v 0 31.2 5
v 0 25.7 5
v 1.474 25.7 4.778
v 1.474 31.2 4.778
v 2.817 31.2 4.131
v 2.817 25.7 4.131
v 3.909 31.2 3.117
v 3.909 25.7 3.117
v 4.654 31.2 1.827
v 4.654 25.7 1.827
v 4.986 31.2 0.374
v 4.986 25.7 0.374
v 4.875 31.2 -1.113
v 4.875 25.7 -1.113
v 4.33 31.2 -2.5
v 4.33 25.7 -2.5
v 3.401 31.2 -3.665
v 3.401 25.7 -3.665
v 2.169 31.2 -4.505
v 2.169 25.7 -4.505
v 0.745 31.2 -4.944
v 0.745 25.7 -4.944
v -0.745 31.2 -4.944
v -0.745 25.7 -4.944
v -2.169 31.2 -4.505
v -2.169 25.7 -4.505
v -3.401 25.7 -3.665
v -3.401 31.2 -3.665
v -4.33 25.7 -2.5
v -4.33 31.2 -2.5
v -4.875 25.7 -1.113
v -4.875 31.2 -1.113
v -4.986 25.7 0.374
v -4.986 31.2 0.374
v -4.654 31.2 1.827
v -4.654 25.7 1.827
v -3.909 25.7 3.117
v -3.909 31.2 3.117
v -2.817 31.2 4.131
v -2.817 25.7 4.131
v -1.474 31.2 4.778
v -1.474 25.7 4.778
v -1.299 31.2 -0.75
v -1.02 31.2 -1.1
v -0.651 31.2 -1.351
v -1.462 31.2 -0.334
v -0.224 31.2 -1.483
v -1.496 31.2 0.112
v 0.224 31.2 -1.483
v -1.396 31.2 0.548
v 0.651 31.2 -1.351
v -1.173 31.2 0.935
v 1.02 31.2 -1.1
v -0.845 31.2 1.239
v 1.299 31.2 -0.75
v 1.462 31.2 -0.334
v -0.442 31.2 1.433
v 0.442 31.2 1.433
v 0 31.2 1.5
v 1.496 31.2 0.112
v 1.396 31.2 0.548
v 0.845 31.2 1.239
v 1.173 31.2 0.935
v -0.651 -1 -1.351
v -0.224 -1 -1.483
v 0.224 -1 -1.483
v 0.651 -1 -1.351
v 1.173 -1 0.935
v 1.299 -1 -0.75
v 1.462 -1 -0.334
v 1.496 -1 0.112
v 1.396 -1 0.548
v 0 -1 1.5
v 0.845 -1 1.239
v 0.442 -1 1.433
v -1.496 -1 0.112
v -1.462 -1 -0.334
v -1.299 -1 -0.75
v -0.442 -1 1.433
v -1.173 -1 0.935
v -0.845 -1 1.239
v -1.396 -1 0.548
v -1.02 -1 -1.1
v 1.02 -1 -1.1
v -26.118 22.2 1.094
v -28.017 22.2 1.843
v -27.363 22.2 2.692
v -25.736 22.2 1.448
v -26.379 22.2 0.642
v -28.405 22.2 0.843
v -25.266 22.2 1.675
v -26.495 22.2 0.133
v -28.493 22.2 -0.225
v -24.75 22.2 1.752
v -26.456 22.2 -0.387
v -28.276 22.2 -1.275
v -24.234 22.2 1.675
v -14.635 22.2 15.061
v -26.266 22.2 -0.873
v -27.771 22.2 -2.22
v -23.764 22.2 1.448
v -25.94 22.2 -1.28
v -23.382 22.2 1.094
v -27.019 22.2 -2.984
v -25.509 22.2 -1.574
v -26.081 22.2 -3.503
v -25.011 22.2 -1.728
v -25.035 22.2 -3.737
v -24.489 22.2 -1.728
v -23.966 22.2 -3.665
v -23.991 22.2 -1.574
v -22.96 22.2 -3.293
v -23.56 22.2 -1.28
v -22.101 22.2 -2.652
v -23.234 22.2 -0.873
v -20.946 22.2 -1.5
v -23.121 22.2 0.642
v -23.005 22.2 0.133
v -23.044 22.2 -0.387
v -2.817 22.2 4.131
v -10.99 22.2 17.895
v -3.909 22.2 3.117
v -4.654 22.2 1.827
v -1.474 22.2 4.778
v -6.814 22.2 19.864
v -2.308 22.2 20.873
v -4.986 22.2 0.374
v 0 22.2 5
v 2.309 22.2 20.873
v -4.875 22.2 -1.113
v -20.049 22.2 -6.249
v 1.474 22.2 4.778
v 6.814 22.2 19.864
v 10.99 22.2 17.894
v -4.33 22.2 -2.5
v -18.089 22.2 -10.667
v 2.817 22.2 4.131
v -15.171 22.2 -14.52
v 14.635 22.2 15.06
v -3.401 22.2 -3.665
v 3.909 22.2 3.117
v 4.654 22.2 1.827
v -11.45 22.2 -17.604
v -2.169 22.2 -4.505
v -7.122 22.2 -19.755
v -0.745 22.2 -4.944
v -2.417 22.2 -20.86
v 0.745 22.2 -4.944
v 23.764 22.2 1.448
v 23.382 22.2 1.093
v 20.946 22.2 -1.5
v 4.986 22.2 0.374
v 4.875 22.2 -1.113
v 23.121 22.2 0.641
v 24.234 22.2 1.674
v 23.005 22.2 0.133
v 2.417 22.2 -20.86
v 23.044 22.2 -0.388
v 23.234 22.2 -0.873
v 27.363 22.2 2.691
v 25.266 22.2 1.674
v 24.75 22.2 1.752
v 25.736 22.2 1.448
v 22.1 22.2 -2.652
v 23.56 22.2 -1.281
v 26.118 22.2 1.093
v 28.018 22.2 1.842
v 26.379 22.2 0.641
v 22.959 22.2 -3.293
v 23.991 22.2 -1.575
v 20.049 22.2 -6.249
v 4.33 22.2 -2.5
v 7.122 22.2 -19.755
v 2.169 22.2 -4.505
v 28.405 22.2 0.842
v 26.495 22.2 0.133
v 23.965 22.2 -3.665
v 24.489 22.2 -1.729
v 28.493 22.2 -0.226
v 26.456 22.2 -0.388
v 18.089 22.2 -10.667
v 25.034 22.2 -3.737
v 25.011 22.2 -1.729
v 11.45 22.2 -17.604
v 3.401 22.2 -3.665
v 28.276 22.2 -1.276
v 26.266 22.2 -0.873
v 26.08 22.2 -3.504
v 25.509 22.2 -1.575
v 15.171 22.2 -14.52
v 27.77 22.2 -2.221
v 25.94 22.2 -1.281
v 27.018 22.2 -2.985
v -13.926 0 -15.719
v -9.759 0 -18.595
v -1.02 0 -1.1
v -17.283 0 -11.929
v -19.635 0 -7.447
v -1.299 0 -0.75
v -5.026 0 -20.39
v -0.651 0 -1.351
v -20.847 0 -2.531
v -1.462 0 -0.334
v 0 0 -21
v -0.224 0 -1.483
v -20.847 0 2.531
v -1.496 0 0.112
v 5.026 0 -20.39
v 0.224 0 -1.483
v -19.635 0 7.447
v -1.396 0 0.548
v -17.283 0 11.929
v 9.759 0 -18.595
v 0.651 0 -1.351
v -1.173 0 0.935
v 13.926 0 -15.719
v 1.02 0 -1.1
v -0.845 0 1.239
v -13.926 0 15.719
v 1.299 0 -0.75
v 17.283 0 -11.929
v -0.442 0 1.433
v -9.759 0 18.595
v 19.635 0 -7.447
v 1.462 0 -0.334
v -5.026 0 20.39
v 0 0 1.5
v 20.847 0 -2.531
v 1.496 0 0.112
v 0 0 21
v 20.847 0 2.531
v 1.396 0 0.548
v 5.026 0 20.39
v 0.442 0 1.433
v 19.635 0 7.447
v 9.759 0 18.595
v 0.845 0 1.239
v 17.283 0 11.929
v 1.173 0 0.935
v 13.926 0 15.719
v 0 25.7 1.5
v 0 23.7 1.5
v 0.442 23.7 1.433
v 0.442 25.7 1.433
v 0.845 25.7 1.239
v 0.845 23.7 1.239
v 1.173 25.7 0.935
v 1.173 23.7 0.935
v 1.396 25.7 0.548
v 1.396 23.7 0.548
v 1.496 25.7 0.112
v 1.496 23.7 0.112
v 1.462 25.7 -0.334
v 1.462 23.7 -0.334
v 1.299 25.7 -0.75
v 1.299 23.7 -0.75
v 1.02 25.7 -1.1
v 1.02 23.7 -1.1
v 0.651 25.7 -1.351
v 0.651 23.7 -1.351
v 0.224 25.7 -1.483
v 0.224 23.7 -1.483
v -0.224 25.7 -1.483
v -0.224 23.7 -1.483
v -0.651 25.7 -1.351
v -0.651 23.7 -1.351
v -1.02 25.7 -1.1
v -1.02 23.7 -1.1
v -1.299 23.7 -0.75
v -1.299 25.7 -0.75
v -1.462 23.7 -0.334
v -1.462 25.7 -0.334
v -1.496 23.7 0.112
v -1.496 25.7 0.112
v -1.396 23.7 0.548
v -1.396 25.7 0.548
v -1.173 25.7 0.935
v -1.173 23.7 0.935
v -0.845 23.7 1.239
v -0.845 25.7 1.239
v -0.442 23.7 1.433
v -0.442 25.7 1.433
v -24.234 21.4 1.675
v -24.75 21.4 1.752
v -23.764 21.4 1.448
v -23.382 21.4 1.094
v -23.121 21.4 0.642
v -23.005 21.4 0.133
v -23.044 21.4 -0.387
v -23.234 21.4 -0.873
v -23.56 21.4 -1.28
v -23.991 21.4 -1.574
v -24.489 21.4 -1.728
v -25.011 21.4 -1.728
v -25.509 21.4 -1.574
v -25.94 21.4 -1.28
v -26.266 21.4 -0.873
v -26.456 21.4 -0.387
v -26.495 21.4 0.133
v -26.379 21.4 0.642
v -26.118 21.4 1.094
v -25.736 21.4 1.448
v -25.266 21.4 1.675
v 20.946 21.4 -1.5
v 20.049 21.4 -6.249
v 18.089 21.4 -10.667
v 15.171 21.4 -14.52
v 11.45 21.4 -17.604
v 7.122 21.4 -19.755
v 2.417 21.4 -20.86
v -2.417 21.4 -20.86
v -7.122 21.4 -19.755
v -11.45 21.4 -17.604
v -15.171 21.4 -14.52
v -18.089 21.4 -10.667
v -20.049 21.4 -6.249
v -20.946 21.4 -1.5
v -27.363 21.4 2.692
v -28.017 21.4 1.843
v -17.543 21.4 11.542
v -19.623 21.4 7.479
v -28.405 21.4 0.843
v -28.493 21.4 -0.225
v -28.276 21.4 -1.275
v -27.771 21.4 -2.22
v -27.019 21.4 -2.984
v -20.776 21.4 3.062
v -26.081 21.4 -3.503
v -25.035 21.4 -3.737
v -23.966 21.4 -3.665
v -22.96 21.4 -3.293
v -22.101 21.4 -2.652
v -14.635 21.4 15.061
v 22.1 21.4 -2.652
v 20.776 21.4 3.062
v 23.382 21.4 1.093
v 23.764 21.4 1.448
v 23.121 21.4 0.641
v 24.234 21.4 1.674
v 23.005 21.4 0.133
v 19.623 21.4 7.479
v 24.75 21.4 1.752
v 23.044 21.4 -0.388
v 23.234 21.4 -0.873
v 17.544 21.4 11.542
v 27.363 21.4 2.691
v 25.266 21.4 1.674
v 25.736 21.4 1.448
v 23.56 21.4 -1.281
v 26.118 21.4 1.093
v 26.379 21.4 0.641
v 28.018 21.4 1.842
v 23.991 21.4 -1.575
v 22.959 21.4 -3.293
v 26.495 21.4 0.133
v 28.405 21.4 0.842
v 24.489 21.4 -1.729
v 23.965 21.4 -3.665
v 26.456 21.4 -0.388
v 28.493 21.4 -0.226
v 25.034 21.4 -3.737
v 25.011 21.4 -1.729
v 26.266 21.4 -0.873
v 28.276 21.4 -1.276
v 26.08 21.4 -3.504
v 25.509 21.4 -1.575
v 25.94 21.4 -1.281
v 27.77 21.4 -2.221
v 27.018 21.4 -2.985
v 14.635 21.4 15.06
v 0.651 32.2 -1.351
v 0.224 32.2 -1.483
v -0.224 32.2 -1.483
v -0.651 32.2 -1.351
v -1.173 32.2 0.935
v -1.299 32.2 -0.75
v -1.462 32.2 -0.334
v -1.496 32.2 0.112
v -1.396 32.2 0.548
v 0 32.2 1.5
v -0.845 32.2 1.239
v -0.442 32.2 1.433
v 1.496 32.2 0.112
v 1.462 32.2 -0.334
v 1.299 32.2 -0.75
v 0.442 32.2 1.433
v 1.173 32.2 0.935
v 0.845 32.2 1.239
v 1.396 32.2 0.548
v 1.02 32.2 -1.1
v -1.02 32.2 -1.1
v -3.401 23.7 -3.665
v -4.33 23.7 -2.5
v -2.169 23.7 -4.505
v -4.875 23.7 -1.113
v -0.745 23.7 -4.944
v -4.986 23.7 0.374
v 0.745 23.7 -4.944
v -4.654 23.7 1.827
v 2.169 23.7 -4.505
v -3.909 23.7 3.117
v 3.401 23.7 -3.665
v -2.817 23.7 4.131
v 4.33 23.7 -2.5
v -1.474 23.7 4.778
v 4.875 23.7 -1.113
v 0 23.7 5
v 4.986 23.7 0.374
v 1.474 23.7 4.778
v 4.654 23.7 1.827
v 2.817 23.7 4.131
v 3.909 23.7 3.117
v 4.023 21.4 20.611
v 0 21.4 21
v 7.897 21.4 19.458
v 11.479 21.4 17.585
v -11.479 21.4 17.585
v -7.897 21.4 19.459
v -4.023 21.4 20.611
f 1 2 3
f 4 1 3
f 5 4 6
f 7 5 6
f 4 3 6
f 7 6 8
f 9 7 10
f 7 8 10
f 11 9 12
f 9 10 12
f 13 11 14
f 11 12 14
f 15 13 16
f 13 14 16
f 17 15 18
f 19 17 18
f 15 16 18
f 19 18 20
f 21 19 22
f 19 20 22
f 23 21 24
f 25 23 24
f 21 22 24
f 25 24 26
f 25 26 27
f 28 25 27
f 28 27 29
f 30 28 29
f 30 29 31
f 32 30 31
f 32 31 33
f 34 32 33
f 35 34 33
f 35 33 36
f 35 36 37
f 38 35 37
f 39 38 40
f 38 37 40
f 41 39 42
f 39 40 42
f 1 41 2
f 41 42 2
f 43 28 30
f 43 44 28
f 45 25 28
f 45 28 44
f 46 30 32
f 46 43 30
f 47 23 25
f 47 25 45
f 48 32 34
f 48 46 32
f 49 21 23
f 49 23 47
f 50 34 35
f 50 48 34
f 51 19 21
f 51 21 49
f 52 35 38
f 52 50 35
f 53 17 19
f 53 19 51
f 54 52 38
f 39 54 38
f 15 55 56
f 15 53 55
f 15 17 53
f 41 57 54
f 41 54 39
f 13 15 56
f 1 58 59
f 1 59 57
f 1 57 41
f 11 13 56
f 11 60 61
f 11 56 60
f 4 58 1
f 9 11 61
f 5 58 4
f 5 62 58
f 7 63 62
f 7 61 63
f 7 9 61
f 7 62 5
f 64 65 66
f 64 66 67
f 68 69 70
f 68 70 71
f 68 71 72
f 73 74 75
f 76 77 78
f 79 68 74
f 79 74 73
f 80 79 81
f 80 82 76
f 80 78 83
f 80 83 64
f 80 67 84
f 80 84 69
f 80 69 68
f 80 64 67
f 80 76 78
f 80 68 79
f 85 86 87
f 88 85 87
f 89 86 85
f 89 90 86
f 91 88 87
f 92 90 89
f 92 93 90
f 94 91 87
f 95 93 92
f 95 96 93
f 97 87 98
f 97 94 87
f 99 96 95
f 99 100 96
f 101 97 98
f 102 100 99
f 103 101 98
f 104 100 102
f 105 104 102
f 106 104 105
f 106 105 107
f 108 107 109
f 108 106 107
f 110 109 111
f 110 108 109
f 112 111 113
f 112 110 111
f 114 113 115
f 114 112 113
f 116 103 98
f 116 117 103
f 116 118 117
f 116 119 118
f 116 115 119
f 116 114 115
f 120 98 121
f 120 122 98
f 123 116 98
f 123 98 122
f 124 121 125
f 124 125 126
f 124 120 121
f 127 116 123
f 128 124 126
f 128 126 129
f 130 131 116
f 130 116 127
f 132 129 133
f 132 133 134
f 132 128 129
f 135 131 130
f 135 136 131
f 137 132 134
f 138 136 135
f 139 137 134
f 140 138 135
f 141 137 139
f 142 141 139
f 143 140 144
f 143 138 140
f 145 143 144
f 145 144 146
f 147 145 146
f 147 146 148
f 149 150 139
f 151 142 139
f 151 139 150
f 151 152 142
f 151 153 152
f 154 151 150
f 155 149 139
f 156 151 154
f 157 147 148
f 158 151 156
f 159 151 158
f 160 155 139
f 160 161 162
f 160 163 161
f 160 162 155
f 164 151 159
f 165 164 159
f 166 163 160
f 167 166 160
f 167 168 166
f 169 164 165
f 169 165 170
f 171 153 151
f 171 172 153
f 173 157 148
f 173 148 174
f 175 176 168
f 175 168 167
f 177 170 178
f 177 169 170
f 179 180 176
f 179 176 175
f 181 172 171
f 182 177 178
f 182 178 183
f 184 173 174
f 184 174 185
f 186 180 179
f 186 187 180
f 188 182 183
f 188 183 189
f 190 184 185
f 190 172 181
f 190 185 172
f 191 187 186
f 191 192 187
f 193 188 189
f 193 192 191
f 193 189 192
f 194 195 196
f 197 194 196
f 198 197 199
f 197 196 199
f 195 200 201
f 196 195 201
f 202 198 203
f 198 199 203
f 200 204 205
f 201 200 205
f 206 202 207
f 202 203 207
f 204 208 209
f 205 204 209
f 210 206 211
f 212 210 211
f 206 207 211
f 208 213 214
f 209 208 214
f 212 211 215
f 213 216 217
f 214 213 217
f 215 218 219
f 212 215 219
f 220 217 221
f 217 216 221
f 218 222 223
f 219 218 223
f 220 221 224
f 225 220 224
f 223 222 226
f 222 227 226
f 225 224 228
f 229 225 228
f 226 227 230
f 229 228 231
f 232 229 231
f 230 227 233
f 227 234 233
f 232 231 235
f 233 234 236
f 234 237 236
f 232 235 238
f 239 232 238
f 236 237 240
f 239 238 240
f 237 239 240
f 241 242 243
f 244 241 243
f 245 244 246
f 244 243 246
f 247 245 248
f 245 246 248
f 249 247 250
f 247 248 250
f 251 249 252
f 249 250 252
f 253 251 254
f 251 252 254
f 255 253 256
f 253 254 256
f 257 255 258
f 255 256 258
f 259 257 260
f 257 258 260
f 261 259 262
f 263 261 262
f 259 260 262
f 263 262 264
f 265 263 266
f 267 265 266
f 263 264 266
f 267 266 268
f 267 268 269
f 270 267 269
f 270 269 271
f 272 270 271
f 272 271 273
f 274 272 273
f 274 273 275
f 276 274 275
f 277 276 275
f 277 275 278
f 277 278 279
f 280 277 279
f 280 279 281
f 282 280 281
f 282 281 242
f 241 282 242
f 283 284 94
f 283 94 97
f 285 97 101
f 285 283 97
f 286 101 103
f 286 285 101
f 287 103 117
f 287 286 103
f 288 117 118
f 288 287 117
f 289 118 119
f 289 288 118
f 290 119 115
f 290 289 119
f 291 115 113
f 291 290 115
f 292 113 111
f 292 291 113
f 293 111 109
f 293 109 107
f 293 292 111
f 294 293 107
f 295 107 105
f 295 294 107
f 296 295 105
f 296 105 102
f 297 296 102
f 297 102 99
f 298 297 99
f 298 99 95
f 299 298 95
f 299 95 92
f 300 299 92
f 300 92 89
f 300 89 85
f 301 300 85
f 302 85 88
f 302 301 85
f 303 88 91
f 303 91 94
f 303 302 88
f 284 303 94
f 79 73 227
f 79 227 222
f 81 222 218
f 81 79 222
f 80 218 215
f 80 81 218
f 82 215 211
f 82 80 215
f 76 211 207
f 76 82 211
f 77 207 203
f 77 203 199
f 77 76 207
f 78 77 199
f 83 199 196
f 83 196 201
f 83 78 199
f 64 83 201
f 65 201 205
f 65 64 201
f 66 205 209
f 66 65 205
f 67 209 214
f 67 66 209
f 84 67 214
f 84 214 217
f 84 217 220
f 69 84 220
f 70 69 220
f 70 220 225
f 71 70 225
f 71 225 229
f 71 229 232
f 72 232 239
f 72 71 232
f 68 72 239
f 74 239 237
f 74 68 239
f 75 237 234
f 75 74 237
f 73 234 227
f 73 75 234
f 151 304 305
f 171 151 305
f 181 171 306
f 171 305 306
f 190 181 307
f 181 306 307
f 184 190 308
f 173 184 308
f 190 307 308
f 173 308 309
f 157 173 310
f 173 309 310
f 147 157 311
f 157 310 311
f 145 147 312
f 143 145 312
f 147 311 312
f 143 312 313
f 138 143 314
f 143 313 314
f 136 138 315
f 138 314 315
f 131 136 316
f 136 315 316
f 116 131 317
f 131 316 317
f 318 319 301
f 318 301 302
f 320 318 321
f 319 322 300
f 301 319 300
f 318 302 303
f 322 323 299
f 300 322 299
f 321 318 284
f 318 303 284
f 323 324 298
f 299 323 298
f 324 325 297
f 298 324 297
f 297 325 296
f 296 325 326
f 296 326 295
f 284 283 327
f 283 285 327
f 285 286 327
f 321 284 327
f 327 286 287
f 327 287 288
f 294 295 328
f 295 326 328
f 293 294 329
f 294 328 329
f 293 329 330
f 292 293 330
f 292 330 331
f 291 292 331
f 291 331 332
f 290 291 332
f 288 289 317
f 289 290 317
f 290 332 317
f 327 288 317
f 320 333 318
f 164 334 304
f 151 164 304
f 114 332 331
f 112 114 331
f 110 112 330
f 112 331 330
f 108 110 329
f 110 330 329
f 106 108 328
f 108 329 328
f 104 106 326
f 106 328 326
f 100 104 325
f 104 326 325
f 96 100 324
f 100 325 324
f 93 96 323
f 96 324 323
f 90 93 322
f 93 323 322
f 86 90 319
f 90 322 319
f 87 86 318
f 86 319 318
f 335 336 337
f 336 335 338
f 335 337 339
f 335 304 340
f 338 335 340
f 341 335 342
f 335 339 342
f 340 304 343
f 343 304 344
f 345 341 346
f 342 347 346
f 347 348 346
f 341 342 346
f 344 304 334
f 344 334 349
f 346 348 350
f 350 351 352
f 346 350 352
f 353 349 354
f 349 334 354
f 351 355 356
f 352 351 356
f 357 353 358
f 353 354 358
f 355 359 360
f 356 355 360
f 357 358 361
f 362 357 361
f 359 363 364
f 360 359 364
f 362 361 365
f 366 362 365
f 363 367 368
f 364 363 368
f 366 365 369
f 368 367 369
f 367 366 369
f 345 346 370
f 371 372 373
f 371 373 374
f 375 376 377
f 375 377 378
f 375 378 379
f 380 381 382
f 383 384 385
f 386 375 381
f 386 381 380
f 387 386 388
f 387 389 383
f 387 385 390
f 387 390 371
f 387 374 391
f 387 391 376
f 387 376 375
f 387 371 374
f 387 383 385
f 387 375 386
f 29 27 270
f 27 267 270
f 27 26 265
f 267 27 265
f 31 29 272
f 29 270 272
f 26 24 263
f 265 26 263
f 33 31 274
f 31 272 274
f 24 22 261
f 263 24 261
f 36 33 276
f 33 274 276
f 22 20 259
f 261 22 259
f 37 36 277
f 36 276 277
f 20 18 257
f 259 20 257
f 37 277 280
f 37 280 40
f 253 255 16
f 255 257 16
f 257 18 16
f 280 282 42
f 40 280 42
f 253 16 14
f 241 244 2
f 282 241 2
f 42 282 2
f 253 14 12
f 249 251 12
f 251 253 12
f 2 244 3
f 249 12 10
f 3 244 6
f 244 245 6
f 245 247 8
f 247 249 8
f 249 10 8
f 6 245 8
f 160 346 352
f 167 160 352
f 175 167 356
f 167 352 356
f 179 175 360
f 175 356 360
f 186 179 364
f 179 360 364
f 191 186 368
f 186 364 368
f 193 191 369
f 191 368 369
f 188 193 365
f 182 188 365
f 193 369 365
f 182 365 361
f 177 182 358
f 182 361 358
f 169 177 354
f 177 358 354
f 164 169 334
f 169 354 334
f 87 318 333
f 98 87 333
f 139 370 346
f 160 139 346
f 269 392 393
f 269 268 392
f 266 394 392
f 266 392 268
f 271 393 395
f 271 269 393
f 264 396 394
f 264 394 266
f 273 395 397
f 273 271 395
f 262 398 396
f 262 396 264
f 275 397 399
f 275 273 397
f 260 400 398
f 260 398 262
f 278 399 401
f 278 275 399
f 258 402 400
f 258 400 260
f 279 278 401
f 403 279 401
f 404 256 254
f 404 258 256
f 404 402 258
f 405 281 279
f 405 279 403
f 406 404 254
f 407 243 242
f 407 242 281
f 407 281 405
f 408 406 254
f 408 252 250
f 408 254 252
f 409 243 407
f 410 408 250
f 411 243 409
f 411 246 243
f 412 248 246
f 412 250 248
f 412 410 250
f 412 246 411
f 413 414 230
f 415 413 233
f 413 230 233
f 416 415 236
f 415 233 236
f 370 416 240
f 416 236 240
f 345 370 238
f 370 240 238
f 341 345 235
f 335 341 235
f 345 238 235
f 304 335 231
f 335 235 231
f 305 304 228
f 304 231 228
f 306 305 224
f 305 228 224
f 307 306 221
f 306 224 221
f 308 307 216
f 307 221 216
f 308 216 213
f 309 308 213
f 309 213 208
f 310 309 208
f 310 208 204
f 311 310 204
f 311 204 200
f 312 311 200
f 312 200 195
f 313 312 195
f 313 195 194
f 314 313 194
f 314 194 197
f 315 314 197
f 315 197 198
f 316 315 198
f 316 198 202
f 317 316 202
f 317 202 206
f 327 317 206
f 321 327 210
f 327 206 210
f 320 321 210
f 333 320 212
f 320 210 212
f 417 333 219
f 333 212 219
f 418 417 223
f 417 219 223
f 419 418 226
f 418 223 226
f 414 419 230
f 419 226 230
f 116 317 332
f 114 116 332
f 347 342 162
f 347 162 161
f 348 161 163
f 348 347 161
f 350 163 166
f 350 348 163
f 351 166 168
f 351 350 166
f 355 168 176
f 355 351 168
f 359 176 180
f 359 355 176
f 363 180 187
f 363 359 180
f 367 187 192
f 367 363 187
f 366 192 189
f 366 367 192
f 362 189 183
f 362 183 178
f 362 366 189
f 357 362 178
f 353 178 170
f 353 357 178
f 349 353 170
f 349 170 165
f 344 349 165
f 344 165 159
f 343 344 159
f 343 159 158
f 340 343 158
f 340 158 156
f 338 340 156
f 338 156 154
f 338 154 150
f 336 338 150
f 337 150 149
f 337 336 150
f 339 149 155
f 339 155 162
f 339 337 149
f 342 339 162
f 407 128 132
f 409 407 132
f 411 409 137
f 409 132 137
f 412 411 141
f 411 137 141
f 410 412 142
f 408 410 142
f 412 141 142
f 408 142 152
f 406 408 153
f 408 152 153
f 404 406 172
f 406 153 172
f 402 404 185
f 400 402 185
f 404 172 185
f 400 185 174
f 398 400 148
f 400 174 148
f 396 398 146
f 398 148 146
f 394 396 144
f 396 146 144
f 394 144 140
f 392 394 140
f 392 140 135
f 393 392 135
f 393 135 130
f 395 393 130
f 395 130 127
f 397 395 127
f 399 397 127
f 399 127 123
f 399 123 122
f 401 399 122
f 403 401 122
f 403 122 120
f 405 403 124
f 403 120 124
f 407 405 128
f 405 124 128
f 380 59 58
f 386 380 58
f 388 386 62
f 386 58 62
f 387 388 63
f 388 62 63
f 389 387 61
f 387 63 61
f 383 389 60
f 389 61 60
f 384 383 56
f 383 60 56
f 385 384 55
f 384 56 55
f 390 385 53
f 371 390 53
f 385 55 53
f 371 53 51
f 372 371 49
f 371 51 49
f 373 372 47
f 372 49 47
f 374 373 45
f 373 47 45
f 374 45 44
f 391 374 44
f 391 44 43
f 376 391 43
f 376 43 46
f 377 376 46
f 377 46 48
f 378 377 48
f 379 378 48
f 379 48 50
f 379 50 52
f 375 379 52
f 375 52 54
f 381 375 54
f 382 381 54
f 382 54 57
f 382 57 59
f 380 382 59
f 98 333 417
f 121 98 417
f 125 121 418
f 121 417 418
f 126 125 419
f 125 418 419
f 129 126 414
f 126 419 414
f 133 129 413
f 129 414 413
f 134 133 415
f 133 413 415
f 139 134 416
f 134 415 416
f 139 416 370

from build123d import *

# Parameters (mm, degrees)
CROQUIS1_R              = 21
SALIENTE_EXTRUIR1_DEPTH = 21.4
CROQUIS2_R              = 1.750000001
CROQUIS2_R_2            = 1.75
SALIENTE_EXTRUIR2_DEPTH = 0.8
CROQUIS3_R              = 5
SALIENTE_EXTRUIR3_DEPTH = 1.5
CROQUIS4_R              = 1.5
SALIENTE_EXTRUIR4_DEPTH = 8.5
CROQUIS5_R              = 5
CROQUIS5_R_2            = 1.5
SALIENTE_EXTRUIR5_DEPTH = 5.5
SALIENTE_EXTRUIR6_START = 1
CROQUIS6_R              = 1.5
SALIENTE_EXTRUIR6_DEPTH = 1


with BuildPart() as part:
    # Croquis1 → Saliente-Extruir1 (new body)
    with BuildSketch(Plane(origin=(0, 0, 0), x_dir=(1, 0, 0), z_dir=(0, 1, 0))):
        with Locations(Location((0, 0, 0), (0, 0, 270))):
            Circle(CROQUIS1_R)
    extrude(amount=SALIENTE_EXTRUIR1_DEPTH)

    # Croquis2 → Saliente-Extruir2 (add)
    with BuildSketch(Plane(origin=(0, 21.4, 0), x_dir=(1, 0, 0), z_dir=(0, 1, 0))):
        with BuildLine():
            Line((-27.36337, -2.691836219), (-14.634872681, -15.060561132))
            ThreePointArc((-14.634872681, -15.060561132), (0.00030013, -20.999999998), (14.635303163, -15.060142806))
            Line((14.635303163, -15.060142806), (27.363446993, -2.691054009))
            ThreePointArc((27.363446993, -2.691054009), (27.421544543, 2.629863133), (22.100355918, 2.651912466))
            Line((22.100355918, 2.651912466), (20.946382723, 1.499683579))
            ThreePointArc((20.946382723, 1.499683579), (1e-09, 21), (-20.946382722, 1.499683581))
            Line((-20.946382722, 1.499683581), (-22.101170465, 2.652018145))
            ThreePointArc((-22.101170465, 2.652018145), (-27.421985882, 2.628707389), (-27.36337, -2.691836219))
        make_face()
        with Locations(Location((24.75, -0.001742794, 0), (0, 0, 270))):
            Circle(CROQUIS2_R, mode=Mode.SUBTRACT)
        with Locations(Location((-24.749999879, -0.002450302, 0), (0, 0, 270))):
            Circle(CROQUIS2_R_2, mode=Mode.SUBTRACT)
    extrude(amount=SALIENTE_EXTRUIR2_DEPTH)

    # Croquis3 → Saliente-Extruir3 (add)
    with BuildSketch(Plane(origin=(0, 22.2, 0), x_dir=(1, 0, 0), z_dir=(0, 1, 0))):
        with Locations(Location((0, 0, 0), (0, 0, 270))):
            Circle(CROQUIS3_R)
    extrude(amount=SALIENTE_EXTRUIR3_DEPTH)

    # Croquis4 → Saliente-Extruir4 (add)
    with BuildSketch(Plane(origin=(0, 23.7, 0), x_dir=(1, 0, 0), z_dir=(0, 1, 0))):
        with Locations(Location((0, 0, 0), (0, 0, 270))):
            Circle(CROQUIS4_R)
    extrude(amount=SALIENTE_EXTRUIR4_DEPTH)

    # Croquis5 → Saliente-Extruir5 (add)
    with BuildSketch(Plane(origin=(0, 25.7, 0), x_dir=(1, 0, 0), z_dir=(0, 1, 0))):
        with Locations(Location((0, 0, 0), (0, 0, 270))):
            Circle(CROQUIS5_R)
        with Locations(Location((0, 0, 0), (0, 0, 270))):
            Circle(CROQUIS5_R_2, mode=Mode.SUBTRACT)
    extrude(amount=SALIENTE_EXTRUIR5_DEPTH)

    # Croquis6 → Saliente-Extruir6 (add)
    with BuildSketch(Plane.XZ.offset(SALIENTE_EXTRUIR6_START)):
        with Locations(Location((0, 0, 0), (0, 0, 90))):
            Circle(CROQUIS6_R)
    extrude(amount=-SALIENTE_EXTRUIR6_DEPTH)


solid = part.part
